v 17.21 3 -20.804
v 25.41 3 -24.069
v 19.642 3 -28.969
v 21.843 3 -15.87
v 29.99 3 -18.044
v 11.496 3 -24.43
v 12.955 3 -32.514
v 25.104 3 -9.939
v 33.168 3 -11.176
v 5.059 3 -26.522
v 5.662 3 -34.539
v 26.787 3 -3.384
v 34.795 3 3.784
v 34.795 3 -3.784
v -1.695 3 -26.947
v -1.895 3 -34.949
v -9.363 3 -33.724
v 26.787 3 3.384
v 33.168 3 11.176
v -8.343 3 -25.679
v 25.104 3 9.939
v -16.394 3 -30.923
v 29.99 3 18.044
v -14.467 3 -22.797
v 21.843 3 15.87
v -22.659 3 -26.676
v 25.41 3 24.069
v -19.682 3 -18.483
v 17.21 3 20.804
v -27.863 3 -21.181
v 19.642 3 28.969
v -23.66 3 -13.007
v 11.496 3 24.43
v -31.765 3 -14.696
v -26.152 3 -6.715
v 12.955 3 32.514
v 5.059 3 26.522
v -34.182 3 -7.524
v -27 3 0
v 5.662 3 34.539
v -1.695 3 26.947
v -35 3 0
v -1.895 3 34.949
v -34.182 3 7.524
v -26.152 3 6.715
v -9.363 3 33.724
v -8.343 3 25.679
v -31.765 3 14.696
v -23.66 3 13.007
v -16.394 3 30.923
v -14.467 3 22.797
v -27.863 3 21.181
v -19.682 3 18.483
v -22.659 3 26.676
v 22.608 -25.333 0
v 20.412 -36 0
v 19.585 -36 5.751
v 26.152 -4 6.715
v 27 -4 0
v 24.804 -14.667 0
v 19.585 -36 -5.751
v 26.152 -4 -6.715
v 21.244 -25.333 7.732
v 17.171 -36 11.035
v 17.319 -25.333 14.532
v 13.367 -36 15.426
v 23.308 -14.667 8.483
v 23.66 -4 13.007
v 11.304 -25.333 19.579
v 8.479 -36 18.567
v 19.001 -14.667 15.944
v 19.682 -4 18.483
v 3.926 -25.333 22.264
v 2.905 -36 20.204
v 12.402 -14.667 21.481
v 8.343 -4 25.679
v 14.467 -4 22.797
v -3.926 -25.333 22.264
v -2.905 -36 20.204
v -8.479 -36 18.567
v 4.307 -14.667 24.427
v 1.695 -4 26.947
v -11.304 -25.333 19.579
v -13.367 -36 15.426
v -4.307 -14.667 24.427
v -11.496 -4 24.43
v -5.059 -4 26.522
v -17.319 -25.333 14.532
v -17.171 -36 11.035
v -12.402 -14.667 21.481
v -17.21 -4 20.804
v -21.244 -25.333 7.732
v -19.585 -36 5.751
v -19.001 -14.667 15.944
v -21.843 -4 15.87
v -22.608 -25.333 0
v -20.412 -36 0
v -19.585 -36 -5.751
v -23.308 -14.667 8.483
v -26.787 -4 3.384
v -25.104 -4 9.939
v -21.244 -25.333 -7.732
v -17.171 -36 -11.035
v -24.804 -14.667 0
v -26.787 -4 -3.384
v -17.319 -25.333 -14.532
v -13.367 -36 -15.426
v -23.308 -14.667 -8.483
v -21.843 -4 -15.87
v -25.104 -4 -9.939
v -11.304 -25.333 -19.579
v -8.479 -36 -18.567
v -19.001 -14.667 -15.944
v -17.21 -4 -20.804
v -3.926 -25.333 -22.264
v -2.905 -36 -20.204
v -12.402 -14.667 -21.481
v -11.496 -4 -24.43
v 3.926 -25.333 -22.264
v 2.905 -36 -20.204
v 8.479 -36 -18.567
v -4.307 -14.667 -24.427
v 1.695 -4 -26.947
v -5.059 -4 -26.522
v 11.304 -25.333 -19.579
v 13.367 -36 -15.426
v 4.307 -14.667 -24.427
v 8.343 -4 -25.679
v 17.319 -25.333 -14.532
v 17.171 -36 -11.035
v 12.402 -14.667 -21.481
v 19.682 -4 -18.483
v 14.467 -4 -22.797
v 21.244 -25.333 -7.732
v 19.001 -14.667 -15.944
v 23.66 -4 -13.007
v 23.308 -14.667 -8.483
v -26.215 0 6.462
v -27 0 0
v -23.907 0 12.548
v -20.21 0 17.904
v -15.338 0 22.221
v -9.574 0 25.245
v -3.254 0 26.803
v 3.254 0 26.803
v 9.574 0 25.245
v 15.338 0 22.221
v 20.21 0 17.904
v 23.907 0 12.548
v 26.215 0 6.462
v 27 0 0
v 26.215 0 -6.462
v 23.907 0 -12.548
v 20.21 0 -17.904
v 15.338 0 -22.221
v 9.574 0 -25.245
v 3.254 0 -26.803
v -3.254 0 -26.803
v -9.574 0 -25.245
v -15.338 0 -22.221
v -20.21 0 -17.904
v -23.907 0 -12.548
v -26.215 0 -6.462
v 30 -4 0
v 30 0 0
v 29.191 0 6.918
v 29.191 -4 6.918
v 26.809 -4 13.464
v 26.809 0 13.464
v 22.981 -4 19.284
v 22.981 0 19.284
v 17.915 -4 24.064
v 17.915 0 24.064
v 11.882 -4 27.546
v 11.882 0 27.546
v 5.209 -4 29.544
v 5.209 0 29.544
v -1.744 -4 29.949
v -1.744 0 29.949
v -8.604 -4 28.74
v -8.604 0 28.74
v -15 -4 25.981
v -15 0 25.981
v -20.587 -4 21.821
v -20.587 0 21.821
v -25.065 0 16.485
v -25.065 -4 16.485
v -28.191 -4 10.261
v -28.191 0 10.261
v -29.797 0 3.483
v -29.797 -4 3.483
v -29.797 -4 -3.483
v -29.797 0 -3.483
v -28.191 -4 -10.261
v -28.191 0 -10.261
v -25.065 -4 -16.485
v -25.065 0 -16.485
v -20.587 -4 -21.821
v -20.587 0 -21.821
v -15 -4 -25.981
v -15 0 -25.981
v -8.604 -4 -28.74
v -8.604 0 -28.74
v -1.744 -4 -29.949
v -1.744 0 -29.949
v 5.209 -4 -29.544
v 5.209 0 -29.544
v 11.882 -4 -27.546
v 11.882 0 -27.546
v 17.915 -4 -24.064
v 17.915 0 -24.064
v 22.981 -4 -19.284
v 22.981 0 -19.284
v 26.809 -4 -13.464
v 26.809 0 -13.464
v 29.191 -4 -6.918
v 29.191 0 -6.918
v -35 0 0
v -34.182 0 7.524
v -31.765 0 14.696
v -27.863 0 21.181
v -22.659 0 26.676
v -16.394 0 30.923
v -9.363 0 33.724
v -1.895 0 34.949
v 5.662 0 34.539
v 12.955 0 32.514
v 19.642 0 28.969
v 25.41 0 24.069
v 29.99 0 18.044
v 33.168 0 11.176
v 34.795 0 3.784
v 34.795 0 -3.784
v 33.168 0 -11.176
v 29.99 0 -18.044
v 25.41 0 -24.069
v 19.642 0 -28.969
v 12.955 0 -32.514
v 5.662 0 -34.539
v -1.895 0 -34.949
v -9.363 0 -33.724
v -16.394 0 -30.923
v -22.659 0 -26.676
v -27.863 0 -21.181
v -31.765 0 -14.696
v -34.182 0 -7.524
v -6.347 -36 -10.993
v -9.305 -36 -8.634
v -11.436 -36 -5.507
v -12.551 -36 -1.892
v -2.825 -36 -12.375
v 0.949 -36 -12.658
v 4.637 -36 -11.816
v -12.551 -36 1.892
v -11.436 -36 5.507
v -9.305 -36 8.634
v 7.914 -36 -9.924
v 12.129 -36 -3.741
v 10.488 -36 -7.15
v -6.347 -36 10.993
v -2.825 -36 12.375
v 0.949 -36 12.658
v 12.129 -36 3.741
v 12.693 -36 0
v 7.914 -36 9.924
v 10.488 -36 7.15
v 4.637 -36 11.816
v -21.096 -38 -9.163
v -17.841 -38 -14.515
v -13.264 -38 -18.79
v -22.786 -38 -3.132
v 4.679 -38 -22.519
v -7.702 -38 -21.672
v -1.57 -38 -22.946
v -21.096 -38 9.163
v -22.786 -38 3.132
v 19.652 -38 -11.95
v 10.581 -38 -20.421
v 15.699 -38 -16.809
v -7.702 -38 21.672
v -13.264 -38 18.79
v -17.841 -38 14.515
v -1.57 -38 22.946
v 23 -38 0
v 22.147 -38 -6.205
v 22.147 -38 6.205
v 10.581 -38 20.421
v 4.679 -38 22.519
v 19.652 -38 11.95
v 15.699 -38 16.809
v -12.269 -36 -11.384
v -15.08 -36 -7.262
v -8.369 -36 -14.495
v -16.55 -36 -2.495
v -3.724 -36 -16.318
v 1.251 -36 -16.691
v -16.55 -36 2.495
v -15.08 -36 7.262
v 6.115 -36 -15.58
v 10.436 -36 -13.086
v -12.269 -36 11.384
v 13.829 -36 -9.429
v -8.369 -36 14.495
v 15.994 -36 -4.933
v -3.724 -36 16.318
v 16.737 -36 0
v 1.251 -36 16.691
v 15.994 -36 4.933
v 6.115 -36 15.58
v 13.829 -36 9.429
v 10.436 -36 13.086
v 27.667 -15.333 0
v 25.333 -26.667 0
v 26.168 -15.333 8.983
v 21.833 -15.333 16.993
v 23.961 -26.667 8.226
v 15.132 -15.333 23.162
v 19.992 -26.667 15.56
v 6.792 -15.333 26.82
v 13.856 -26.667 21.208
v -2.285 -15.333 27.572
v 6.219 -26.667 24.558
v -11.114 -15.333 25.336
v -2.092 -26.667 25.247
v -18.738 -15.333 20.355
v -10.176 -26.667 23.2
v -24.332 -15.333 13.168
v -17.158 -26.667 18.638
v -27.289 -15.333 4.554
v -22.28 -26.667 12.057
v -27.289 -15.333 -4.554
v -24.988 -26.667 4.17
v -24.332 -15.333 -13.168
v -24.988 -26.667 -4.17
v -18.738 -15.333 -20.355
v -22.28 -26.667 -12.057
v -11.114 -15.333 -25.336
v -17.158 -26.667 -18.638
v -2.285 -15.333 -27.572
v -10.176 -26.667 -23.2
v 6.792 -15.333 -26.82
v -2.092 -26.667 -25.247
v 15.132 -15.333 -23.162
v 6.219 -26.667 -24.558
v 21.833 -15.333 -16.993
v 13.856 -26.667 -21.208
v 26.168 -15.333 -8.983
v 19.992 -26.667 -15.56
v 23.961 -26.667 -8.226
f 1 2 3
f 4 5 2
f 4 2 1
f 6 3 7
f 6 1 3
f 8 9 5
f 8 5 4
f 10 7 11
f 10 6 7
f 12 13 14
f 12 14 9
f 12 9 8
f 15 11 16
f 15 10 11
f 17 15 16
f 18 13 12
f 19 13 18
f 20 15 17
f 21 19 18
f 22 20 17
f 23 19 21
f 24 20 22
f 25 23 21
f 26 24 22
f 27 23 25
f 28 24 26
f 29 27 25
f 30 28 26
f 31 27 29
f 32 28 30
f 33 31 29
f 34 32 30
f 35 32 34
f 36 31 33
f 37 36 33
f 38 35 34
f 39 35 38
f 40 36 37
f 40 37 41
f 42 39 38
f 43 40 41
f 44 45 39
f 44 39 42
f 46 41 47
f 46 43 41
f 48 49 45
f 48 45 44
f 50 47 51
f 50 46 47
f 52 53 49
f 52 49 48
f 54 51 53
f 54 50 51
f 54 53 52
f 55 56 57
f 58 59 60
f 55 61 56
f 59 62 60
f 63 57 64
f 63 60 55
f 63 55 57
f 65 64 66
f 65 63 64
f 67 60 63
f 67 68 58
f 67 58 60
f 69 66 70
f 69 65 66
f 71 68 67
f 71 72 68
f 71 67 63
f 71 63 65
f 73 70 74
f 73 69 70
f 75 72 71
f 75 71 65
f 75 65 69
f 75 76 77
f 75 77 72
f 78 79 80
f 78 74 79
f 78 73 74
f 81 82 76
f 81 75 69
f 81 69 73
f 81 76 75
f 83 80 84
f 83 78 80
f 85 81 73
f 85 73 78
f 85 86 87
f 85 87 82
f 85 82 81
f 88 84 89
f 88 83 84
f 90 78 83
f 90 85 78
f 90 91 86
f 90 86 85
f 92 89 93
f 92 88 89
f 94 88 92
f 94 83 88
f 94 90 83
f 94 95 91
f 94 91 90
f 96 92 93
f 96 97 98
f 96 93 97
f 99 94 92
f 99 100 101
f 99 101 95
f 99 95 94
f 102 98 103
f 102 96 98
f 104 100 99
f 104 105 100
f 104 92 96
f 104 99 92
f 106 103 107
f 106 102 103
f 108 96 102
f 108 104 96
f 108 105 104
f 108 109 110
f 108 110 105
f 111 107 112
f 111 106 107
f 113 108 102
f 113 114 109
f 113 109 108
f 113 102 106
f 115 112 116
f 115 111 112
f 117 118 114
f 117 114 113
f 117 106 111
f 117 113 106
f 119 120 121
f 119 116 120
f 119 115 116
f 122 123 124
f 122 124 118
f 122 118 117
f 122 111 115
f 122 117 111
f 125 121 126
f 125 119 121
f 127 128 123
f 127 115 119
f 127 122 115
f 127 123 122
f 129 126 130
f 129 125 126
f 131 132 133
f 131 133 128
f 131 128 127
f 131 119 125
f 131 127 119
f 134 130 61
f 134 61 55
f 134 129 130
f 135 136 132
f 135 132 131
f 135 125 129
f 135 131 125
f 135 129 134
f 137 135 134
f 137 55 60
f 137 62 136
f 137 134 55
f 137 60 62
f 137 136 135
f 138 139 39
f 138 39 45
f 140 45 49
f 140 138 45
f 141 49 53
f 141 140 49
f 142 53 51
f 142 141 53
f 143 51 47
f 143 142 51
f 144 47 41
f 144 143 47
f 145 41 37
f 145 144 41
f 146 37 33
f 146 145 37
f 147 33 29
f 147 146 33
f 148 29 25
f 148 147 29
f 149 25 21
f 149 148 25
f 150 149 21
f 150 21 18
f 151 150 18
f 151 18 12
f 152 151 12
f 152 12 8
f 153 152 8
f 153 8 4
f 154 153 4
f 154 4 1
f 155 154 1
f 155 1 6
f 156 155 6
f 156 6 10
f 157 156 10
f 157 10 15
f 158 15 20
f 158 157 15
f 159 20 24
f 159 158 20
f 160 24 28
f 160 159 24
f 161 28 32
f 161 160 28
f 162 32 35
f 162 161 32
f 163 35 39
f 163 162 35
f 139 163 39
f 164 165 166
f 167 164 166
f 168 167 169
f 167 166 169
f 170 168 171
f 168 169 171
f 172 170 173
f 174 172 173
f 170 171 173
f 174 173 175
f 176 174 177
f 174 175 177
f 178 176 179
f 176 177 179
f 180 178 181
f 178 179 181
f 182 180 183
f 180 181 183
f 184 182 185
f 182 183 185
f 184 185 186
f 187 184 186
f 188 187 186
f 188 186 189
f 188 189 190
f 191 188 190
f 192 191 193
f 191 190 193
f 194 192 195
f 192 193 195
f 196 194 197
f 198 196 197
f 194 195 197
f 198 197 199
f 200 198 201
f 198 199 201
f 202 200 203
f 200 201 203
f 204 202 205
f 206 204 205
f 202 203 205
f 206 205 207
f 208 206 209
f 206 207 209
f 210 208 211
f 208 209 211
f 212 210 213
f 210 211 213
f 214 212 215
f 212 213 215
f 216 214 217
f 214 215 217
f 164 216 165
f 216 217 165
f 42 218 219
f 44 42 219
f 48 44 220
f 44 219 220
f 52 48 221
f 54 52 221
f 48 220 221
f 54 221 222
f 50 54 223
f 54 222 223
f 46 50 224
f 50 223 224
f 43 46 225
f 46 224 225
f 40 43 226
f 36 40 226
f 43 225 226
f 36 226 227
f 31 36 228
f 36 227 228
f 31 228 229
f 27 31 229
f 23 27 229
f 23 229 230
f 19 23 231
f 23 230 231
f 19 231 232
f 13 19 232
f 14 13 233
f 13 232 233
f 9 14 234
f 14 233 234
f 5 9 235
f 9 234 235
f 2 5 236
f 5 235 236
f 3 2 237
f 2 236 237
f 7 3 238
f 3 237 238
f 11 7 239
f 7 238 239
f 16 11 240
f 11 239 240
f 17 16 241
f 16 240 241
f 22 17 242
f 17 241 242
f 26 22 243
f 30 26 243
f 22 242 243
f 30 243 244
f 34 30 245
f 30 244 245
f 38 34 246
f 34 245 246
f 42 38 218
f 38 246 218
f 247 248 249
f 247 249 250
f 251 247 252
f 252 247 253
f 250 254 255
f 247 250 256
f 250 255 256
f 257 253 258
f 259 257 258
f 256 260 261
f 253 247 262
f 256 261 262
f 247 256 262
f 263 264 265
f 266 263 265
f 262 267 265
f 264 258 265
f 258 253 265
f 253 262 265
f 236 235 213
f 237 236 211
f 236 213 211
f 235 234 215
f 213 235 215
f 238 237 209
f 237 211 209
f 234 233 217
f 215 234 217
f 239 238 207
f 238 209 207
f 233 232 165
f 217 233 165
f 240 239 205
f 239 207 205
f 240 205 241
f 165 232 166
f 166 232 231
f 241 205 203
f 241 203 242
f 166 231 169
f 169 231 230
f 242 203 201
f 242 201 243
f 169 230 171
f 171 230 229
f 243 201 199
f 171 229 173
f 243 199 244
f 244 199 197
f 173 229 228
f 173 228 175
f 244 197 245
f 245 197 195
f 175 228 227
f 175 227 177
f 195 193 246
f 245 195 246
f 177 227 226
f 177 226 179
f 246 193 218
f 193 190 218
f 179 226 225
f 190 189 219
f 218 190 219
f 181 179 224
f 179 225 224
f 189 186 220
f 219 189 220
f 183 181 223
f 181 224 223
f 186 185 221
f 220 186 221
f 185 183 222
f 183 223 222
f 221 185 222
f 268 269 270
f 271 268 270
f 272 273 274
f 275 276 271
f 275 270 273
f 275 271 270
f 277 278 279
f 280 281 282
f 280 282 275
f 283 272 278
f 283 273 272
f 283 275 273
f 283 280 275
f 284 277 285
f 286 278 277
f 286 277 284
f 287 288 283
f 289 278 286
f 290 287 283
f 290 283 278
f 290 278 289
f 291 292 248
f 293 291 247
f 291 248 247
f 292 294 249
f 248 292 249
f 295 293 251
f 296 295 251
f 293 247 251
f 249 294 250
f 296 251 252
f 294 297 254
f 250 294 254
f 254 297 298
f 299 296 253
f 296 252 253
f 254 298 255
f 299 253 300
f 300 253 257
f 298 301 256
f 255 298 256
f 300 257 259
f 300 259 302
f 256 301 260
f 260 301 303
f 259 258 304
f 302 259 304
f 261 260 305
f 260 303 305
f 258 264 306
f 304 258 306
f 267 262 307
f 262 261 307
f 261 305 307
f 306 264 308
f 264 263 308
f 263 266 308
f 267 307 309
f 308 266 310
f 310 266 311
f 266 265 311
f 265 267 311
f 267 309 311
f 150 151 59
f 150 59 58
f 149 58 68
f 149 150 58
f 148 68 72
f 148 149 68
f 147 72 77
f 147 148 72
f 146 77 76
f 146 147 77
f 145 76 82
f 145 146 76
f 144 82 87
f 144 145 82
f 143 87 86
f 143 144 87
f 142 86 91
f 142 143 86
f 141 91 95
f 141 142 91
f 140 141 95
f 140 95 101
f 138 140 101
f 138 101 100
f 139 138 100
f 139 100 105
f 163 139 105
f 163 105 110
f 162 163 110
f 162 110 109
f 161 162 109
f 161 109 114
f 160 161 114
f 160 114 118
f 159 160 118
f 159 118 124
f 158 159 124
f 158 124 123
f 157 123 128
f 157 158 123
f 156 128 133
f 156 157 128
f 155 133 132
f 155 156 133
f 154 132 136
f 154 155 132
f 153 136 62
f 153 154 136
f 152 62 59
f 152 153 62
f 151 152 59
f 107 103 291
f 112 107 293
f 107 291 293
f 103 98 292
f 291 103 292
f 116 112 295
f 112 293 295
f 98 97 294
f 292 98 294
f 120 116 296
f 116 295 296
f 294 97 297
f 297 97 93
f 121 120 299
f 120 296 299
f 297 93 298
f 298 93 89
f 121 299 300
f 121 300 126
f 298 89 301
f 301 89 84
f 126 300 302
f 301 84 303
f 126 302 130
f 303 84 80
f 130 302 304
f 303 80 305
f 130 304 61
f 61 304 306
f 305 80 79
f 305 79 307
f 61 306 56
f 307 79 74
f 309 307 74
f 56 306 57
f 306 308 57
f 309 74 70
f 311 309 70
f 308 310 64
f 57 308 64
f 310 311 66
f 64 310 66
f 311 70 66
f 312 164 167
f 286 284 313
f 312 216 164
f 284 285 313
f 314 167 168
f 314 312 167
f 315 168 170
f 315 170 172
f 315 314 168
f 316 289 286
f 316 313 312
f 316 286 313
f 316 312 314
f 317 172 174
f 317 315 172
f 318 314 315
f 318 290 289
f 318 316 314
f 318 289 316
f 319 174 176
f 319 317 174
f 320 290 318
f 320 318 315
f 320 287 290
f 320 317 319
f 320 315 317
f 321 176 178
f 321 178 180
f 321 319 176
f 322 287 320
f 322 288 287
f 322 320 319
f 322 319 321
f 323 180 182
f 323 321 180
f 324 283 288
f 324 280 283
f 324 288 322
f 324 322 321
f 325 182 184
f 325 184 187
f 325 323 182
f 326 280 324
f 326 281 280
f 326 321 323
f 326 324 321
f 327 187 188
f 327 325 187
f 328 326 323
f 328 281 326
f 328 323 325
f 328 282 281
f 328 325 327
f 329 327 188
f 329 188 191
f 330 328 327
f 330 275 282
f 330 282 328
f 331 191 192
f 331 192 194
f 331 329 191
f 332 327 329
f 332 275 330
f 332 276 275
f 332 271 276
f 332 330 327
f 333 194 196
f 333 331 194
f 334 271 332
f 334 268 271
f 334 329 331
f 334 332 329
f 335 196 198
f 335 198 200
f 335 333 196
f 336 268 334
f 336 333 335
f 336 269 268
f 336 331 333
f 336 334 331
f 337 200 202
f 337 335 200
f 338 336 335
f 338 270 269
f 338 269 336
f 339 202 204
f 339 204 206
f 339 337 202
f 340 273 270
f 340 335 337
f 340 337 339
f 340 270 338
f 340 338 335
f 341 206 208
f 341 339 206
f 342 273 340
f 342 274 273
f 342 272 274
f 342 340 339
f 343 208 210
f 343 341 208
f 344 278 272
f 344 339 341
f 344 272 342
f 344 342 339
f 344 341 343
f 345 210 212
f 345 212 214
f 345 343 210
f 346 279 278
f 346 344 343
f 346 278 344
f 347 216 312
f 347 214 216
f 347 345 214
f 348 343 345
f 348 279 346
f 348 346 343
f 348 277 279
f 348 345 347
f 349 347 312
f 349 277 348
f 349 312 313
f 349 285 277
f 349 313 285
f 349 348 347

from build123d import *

# Parameters (mm, degrees)
F0_R      = 30
F0_R_2    = 27
F1_DEPTH  = 4
F4_R      = 30
F3_R      = 23
F7_R      = 20
F6_R      = 27
F9_R      = 22.403667
F9_R_2    = 12.693191
F10_DEPTH = 2
F11_R     = 35
F11_R_2   = 27
F12_DEPTH = 3
F13_R     = 16.737404
F14_DEPTH = 2


with BuildPart() as f1:
    # F0 (on Front) → F1 (new body)
    with BuildSketch(Plane.XZ):
        Circle(F0_R)
        Circle(F0_R_2, mode=Mode.SUBTRACT)
    extrude(amount=F1_DEPTH)

    # F4 (on face) → F5 section 0
    with BuildSketch(Plane.XZ.offset(4)):
        Circle(F4_R)
    # F3 (on offset) → F5 section 1
    with BuildSketch(Plane.XZ.offset(38)):
        Circle(F3_R)
    loft()

    # F7 (on face) → F8 section 0
    with BuildSketch(Plane.XZ.offset(38)):
        Circle(F7_R)
    # F6 (on face) → F8 section 1
    with BuildSketch(Plane(origin=(0, -4, 0), x_dir=(-1, 0, 0), z_dir=(0, 1, 0))):
        Circle(F6_R)
    loft(mode=Mode.SUBTRACT)

    # F9 (on face) → F10 (join)
    with BuildSketch(Plane.XZ.offset(38)):
        Circle(F9_R)
        Circle(F9_R_2, mode=Mode.SUBTRACT)
    extrude(amount=-F10_DEPTH)

    # F11 (on face) → F12 (join)
    with BuildSketch(Plane(origin=(0, 0, 0), x_dir=(-1, 0, 0), z_dir=(0, 1, 0))):
        Circle(F11_R)
        Circle(F11_R_2, mode=Mode.SUBTRACT)
    extrude(amount=F12_DEPTH)

    # F13 (on face) → F14 (join)
    with BuildSketch(Plane.XZ.offset(38)):
        Circle(F13_R)
    extrude(amount=-F14_DEPTH)


solid = f1.part
